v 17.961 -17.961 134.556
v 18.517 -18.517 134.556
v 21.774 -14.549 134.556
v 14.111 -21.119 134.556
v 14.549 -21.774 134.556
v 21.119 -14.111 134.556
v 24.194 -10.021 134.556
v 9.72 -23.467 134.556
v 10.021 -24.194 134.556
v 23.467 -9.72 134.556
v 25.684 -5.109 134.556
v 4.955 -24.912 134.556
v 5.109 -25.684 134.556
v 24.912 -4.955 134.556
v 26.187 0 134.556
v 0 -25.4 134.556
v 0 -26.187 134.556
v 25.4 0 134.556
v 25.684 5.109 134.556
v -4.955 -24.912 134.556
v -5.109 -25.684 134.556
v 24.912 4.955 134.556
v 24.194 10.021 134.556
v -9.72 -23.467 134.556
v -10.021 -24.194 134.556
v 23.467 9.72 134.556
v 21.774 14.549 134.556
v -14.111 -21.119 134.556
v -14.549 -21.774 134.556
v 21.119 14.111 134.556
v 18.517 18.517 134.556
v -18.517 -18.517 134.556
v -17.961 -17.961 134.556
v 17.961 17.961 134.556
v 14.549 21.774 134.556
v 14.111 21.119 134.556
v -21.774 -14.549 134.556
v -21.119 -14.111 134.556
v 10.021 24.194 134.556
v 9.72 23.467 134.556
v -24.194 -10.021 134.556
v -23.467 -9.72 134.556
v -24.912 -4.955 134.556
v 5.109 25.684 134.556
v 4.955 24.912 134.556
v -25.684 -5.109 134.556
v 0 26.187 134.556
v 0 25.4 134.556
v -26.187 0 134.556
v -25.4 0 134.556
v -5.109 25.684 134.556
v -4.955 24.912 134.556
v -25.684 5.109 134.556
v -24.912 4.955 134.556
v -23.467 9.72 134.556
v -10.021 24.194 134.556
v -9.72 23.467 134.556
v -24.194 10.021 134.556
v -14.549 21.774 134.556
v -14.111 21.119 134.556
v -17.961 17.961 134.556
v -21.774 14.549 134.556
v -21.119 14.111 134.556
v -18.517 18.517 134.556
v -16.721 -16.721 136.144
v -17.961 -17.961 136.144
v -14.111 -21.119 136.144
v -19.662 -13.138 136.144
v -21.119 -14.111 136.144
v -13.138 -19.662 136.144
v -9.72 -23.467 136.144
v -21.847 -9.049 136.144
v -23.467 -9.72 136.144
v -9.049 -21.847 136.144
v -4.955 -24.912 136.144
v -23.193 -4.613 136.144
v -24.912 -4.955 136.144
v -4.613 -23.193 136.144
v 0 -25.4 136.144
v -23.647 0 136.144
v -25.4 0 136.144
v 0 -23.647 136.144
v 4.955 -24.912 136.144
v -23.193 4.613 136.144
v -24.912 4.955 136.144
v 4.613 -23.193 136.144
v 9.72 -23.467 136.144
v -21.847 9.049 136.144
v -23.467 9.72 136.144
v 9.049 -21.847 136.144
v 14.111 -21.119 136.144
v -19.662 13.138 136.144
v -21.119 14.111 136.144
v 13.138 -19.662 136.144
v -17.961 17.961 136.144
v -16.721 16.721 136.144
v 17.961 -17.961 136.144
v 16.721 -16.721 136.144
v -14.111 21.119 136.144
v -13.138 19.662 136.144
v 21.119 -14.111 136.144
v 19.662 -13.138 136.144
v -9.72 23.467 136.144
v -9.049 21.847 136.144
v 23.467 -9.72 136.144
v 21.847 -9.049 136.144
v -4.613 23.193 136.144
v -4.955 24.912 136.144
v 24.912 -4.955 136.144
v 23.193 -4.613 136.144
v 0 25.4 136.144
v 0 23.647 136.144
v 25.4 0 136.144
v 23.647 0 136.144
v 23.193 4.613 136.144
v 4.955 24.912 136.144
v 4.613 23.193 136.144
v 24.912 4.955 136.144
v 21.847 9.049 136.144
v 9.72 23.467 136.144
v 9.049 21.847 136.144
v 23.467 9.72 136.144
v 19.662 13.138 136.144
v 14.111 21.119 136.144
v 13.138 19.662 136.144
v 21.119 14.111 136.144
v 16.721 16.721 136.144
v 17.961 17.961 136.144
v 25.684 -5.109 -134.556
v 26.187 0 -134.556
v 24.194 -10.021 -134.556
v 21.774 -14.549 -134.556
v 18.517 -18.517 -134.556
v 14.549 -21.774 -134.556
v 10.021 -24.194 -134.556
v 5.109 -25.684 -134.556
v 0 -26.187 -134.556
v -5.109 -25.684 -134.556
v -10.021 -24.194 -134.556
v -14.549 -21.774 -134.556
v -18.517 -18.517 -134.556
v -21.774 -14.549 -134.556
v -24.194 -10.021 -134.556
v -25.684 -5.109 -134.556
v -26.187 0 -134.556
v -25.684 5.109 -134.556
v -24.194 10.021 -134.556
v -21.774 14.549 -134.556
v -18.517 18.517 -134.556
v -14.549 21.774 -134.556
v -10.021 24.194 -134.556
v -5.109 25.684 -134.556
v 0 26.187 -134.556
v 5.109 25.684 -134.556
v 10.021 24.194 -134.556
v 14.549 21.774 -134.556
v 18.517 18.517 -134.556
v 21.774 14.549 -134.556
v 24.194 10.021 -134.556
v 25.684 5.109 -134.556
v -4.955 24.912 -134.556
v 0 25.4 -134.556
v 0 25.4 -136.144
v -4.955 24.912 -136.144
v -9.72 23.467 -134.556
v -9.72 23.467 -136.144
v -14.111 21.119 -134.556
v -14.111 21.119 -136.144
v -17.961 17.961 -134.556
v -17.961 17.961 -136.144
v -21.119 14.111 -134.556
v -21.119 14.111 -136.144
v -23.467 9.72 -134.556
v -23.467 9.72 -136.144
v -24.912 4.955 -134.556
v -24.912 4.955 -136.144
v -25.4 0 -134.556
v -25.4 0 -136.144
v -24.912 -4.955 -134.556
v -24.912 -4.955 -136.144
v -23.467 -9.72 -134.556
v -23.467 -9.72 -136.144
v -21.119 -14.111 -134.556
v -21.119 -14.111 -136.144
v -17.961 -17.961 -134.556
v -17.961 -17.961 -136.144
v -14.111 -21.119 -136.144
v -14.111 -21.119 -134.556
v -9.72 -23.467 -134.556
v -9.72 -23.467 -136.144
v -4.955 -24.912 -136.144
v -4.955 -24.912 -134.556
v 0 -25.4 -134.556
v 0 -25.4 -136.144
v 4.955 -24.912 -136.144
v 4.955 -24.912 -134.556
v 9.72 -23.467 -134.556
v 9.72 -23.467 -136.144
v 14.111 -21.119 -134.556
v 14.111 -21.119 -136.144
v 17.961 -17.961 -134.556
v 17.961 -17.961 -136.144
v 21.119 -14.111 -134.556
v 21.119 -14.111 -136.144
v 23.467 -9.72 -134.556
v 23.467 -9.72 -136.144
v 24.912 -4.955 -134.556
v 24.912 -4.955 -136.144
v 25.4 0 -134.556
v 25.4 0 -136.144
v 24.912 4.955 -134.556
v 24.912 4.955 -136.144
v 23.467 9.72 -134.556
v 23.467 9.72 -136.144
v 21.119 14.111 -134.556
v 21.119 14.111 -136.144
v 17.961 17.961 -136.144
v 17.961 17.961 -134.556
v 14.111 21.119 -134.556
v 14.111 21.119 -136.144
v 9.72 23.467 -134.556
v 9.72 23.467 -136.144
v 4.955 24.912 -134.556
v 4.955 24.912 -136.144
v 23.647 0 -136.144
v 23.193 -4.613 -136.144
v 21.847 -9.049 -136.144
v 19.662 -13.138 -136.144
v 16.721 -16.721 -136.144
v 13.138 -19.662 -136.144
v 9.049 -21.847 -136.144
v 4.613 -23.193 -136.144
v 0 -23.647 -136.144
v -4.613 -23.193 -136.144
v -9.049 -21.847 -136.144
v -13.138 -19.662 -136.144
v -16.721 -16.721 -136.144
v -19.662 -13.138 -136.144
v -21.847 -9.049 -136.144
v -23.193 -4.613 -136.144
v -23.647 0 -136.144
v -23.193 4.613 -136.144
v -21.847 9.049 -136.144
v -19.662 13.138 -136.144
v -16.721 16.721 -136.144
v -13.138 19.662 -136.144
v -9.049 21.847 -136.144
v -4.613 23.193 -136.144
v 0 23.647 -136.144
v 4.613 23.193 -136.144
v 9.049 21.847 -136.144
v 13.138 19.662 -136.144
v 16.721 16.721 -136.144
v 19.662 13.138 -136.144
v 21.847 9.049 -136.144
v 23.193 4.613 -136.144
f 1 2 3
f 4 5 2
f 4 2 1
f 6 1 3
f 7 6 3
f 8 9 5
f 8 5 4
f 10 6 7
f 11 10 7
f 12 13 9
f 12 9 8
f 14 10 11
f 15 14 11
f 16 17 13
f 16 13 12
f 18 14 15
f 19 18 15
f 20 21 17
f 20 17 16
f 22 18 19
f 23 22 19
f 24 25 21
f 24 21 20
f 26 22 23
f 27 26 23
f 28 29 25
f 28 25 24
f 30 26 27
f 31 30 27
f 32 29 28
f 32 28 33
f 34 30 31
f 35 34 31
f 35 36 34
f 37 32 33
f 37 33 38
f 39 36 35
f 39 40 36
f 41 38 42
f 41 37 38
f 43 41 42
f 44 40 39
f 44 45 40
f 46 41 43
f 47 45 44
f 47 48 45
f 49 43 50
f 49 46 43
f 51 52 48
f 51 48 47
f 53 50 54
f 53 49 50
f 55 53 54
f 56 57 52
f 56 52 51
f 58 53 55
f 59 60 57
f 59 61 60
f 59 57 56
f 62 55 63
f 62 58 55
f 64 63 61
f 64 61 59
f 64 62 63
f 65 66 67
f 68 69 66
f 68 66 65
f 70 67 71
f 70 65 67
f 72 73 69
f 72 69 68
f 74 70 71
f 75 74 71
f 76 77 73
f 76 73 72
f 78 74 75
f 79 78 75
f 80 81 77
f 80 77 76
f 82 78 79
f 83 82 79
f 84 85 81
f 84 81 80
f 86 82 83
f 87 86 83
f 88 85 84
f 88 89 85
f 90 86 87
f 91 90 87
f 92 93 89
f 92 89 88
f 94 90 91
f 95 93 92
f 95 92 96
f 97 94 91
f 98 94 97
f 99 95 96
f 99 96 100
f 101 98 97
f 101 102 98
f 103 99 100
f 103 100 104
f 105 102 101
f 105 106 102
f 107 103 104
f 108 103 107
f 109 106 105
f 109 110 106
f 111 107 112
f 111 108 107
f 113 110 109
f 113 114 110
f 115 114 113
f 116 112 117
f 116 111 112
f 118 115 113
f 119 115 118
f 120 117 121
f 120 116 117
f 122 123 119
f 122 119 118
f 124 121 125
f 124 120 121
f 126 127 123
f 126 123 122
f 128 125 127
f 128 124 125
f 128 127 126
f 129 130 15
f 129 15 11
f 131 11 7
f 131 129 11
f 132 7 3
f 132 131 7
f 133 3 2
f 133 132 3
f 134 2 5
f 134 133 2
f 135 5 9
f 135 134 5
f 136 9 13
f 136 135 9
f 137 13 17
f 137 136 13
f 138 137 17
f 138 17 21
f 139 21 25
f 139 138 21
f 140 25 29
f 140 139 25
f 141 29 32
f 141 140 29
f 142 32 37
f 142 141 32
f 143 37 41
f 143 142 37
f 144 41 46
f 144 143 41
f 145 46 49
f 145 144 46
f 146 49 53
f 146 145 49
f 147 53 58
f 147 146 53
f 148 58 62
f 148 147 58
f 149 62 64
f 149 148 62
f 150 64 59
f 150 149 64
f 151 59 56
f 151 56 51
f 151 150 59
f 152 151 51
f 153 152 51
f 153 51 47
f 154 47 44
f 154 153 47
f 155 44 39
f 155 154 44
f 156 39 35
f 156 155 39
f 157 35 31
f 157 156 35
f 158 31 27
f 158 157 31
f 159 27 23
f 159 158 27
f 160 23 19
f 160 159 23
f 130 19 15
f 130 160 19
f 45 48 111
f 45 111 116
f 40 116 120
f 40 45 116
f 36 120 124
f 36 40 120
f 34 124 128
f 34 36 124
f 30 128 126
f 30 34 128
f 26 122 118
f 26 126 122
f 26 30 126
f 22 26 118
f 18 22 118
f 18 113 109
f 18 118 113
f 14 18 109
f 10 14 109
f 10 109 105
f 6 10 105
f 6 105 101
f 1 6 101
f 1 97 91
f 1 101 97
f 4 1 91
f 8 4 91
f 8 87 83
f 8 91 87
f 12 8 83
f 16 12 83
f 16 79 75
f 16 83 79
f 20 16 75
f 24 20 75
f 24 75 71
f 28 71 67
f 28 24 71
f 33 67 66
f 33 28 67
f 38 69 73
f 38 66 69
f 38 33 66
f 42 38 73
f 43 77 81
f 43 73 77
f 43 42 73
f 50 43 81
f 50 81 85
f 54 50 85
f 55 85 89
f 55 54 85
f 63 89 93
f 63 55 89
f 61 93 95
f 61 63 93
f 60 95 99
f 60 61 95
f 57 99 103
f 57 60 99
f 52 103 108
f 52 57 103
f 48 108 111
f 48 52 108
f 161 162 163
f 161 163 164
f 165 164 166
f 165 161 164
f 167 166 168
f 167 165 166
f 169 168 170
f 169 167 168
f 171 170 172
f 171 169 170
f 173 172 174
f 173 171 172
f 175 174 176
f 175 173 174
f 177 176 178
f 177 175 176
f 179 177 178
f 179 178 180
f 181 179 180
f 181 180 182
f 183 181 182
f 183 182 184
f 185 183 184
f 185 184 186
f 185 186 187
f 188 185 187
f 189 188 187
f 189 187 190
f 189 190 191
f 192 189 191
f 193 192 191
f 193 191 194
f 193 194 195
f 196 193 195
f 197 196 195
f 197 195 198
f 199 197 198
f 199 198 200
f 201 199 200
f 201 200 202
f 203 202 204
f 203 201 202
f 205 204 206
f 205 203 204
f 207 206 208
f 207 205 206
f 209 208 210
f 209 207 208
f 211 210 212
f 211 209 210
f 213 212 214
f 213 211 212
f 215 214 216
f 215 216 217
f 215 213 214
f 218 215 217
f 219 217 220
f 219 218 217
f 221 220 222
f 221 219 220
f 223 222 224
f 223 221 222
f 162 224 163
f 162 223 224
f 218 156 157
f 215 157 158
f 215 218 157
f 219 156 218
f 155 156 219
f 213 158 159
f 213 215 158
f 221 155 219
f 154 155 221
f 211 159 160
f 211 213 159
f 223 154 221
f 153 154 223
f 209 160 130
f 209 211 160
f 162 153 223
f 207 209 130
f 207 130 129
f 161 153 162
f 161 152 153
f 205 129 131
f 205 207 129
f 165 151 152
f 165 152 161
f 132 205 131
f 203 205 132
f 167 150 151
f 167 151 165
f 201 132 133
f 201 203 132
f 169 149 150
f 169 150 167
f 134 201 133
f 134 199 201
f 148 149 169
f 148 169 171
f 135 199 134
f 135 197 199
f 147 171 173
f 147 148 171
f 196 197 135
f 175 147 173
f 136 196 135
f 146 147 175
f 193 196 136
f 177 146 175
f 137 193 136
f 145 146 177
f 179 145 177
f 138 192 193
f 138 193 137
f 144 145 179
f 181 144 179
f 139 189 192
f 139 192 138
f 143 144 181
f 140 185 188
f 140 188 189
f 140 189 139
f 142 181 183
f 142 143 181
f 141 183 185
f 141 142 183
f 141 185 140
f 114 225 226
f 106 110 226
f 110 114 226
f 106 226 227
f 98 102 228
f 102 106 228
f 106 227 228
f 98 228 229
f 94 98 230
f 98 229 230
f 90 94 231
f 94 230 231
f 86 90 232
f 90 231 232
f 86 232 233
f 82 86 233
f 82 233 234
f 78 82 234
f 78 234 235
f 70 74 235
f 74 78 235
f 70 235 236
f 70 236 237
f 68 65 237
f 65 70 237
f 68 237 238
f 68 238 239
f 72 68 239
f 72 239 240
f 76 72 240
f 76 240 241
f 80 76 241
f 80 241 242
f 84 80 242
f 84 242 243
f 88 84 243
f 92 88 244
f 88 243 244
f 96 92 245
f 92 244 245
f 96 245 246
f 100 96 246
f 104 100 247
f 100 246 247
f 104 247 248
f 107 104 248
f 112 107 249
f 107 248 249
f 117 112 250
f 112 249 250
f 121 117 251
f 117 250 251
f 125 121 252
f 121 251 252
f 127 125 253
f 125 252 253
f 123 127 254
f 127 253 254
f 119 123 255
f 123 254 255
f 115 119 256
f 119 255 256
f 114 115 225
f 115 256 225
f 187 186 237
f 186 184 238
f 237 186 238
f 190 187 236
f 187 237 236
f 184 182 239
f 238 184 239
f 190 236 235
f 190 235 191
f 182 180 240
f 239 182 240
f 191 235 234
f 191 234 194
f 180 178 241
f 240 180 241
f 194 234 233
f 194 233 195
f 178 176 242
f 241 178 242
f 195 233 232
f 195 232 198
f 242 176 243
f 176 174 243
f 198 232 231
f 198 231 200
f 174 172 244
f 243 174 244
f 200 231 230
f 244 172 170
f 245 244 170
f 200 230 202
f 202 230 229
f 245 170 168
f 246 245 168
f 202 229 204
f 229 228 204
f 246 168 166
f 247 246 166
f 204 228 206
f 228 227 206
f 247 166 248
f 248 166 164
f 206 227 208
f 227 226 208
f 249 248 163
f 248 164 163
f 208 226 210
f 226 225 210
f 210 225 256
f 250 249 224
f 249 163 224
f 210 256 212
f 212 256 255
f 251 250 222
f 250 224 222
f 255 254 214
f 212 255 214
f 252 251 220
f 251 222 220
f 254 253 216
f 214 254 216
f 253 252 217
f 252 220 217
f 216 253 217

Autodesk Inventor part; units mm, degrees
ref_plane "YZ Plane" through (0, 0, 0) normal (1, 0, 0) x (0, 1, 0)
ref_plane "XZ Plane" through (0, 0, 0) normal (0, 1, 0) x (-1, 0, 0)
ref_plane "XY Plane" through (0, 0, 0) normal (0, 0, 1) x (1, 0, 0)
sketch "Sketch1" plane through (0, 0, 0) normal (0, 0, 1) x (1, 0, 0)
  circle A0 centre (0, 0) radius 26.1874
  circle A1 centre (0, 0) radius 23.6474
  dimension "d0" = 52.3748
  dimension "d1" = 2.54
extrude "Extrusion1" add sketch "Sketch1" along normal mid plane 272.288
sketch "Sketch2" plane through (0, 0, 0) normal (1, 0, 0) x (0, 1, 0)
  line L0 (-26.1874, 136.144) -> (26.1874, 136.144) projected
  line L1 (-23.6474, 136.144) -> (23.6474, 136.144) projected
  line L2 (26.1874, 136.144) -> (25.4, 136.144)
  line L3 (25.4, 136.144) -> (25.4, 134.5565)
  line L4 (25.4, 134.5565) -> (26.1874, 134.5565)
  line L5 (26.1874, 134.5565) -> (26.1874, 136.144)
  line L6 (0, -14.5288) -> (0, 87.1728) projected
  point P0 (0, 0)
  dimension "d4" = 1.5875
  dimension "d5" = 0.7874
revolve "Revolution1" cut sketch "Sketch2" angle 360 about axis through (0, 0, -10) along (0, 0, 1)
mirror "Mirror1" about plane through (0, 0, 0) normal (0, 0, 1) of "Revolution1"
properties part number "AVT-32-32_Body Tube" material "Stainless Steel"
